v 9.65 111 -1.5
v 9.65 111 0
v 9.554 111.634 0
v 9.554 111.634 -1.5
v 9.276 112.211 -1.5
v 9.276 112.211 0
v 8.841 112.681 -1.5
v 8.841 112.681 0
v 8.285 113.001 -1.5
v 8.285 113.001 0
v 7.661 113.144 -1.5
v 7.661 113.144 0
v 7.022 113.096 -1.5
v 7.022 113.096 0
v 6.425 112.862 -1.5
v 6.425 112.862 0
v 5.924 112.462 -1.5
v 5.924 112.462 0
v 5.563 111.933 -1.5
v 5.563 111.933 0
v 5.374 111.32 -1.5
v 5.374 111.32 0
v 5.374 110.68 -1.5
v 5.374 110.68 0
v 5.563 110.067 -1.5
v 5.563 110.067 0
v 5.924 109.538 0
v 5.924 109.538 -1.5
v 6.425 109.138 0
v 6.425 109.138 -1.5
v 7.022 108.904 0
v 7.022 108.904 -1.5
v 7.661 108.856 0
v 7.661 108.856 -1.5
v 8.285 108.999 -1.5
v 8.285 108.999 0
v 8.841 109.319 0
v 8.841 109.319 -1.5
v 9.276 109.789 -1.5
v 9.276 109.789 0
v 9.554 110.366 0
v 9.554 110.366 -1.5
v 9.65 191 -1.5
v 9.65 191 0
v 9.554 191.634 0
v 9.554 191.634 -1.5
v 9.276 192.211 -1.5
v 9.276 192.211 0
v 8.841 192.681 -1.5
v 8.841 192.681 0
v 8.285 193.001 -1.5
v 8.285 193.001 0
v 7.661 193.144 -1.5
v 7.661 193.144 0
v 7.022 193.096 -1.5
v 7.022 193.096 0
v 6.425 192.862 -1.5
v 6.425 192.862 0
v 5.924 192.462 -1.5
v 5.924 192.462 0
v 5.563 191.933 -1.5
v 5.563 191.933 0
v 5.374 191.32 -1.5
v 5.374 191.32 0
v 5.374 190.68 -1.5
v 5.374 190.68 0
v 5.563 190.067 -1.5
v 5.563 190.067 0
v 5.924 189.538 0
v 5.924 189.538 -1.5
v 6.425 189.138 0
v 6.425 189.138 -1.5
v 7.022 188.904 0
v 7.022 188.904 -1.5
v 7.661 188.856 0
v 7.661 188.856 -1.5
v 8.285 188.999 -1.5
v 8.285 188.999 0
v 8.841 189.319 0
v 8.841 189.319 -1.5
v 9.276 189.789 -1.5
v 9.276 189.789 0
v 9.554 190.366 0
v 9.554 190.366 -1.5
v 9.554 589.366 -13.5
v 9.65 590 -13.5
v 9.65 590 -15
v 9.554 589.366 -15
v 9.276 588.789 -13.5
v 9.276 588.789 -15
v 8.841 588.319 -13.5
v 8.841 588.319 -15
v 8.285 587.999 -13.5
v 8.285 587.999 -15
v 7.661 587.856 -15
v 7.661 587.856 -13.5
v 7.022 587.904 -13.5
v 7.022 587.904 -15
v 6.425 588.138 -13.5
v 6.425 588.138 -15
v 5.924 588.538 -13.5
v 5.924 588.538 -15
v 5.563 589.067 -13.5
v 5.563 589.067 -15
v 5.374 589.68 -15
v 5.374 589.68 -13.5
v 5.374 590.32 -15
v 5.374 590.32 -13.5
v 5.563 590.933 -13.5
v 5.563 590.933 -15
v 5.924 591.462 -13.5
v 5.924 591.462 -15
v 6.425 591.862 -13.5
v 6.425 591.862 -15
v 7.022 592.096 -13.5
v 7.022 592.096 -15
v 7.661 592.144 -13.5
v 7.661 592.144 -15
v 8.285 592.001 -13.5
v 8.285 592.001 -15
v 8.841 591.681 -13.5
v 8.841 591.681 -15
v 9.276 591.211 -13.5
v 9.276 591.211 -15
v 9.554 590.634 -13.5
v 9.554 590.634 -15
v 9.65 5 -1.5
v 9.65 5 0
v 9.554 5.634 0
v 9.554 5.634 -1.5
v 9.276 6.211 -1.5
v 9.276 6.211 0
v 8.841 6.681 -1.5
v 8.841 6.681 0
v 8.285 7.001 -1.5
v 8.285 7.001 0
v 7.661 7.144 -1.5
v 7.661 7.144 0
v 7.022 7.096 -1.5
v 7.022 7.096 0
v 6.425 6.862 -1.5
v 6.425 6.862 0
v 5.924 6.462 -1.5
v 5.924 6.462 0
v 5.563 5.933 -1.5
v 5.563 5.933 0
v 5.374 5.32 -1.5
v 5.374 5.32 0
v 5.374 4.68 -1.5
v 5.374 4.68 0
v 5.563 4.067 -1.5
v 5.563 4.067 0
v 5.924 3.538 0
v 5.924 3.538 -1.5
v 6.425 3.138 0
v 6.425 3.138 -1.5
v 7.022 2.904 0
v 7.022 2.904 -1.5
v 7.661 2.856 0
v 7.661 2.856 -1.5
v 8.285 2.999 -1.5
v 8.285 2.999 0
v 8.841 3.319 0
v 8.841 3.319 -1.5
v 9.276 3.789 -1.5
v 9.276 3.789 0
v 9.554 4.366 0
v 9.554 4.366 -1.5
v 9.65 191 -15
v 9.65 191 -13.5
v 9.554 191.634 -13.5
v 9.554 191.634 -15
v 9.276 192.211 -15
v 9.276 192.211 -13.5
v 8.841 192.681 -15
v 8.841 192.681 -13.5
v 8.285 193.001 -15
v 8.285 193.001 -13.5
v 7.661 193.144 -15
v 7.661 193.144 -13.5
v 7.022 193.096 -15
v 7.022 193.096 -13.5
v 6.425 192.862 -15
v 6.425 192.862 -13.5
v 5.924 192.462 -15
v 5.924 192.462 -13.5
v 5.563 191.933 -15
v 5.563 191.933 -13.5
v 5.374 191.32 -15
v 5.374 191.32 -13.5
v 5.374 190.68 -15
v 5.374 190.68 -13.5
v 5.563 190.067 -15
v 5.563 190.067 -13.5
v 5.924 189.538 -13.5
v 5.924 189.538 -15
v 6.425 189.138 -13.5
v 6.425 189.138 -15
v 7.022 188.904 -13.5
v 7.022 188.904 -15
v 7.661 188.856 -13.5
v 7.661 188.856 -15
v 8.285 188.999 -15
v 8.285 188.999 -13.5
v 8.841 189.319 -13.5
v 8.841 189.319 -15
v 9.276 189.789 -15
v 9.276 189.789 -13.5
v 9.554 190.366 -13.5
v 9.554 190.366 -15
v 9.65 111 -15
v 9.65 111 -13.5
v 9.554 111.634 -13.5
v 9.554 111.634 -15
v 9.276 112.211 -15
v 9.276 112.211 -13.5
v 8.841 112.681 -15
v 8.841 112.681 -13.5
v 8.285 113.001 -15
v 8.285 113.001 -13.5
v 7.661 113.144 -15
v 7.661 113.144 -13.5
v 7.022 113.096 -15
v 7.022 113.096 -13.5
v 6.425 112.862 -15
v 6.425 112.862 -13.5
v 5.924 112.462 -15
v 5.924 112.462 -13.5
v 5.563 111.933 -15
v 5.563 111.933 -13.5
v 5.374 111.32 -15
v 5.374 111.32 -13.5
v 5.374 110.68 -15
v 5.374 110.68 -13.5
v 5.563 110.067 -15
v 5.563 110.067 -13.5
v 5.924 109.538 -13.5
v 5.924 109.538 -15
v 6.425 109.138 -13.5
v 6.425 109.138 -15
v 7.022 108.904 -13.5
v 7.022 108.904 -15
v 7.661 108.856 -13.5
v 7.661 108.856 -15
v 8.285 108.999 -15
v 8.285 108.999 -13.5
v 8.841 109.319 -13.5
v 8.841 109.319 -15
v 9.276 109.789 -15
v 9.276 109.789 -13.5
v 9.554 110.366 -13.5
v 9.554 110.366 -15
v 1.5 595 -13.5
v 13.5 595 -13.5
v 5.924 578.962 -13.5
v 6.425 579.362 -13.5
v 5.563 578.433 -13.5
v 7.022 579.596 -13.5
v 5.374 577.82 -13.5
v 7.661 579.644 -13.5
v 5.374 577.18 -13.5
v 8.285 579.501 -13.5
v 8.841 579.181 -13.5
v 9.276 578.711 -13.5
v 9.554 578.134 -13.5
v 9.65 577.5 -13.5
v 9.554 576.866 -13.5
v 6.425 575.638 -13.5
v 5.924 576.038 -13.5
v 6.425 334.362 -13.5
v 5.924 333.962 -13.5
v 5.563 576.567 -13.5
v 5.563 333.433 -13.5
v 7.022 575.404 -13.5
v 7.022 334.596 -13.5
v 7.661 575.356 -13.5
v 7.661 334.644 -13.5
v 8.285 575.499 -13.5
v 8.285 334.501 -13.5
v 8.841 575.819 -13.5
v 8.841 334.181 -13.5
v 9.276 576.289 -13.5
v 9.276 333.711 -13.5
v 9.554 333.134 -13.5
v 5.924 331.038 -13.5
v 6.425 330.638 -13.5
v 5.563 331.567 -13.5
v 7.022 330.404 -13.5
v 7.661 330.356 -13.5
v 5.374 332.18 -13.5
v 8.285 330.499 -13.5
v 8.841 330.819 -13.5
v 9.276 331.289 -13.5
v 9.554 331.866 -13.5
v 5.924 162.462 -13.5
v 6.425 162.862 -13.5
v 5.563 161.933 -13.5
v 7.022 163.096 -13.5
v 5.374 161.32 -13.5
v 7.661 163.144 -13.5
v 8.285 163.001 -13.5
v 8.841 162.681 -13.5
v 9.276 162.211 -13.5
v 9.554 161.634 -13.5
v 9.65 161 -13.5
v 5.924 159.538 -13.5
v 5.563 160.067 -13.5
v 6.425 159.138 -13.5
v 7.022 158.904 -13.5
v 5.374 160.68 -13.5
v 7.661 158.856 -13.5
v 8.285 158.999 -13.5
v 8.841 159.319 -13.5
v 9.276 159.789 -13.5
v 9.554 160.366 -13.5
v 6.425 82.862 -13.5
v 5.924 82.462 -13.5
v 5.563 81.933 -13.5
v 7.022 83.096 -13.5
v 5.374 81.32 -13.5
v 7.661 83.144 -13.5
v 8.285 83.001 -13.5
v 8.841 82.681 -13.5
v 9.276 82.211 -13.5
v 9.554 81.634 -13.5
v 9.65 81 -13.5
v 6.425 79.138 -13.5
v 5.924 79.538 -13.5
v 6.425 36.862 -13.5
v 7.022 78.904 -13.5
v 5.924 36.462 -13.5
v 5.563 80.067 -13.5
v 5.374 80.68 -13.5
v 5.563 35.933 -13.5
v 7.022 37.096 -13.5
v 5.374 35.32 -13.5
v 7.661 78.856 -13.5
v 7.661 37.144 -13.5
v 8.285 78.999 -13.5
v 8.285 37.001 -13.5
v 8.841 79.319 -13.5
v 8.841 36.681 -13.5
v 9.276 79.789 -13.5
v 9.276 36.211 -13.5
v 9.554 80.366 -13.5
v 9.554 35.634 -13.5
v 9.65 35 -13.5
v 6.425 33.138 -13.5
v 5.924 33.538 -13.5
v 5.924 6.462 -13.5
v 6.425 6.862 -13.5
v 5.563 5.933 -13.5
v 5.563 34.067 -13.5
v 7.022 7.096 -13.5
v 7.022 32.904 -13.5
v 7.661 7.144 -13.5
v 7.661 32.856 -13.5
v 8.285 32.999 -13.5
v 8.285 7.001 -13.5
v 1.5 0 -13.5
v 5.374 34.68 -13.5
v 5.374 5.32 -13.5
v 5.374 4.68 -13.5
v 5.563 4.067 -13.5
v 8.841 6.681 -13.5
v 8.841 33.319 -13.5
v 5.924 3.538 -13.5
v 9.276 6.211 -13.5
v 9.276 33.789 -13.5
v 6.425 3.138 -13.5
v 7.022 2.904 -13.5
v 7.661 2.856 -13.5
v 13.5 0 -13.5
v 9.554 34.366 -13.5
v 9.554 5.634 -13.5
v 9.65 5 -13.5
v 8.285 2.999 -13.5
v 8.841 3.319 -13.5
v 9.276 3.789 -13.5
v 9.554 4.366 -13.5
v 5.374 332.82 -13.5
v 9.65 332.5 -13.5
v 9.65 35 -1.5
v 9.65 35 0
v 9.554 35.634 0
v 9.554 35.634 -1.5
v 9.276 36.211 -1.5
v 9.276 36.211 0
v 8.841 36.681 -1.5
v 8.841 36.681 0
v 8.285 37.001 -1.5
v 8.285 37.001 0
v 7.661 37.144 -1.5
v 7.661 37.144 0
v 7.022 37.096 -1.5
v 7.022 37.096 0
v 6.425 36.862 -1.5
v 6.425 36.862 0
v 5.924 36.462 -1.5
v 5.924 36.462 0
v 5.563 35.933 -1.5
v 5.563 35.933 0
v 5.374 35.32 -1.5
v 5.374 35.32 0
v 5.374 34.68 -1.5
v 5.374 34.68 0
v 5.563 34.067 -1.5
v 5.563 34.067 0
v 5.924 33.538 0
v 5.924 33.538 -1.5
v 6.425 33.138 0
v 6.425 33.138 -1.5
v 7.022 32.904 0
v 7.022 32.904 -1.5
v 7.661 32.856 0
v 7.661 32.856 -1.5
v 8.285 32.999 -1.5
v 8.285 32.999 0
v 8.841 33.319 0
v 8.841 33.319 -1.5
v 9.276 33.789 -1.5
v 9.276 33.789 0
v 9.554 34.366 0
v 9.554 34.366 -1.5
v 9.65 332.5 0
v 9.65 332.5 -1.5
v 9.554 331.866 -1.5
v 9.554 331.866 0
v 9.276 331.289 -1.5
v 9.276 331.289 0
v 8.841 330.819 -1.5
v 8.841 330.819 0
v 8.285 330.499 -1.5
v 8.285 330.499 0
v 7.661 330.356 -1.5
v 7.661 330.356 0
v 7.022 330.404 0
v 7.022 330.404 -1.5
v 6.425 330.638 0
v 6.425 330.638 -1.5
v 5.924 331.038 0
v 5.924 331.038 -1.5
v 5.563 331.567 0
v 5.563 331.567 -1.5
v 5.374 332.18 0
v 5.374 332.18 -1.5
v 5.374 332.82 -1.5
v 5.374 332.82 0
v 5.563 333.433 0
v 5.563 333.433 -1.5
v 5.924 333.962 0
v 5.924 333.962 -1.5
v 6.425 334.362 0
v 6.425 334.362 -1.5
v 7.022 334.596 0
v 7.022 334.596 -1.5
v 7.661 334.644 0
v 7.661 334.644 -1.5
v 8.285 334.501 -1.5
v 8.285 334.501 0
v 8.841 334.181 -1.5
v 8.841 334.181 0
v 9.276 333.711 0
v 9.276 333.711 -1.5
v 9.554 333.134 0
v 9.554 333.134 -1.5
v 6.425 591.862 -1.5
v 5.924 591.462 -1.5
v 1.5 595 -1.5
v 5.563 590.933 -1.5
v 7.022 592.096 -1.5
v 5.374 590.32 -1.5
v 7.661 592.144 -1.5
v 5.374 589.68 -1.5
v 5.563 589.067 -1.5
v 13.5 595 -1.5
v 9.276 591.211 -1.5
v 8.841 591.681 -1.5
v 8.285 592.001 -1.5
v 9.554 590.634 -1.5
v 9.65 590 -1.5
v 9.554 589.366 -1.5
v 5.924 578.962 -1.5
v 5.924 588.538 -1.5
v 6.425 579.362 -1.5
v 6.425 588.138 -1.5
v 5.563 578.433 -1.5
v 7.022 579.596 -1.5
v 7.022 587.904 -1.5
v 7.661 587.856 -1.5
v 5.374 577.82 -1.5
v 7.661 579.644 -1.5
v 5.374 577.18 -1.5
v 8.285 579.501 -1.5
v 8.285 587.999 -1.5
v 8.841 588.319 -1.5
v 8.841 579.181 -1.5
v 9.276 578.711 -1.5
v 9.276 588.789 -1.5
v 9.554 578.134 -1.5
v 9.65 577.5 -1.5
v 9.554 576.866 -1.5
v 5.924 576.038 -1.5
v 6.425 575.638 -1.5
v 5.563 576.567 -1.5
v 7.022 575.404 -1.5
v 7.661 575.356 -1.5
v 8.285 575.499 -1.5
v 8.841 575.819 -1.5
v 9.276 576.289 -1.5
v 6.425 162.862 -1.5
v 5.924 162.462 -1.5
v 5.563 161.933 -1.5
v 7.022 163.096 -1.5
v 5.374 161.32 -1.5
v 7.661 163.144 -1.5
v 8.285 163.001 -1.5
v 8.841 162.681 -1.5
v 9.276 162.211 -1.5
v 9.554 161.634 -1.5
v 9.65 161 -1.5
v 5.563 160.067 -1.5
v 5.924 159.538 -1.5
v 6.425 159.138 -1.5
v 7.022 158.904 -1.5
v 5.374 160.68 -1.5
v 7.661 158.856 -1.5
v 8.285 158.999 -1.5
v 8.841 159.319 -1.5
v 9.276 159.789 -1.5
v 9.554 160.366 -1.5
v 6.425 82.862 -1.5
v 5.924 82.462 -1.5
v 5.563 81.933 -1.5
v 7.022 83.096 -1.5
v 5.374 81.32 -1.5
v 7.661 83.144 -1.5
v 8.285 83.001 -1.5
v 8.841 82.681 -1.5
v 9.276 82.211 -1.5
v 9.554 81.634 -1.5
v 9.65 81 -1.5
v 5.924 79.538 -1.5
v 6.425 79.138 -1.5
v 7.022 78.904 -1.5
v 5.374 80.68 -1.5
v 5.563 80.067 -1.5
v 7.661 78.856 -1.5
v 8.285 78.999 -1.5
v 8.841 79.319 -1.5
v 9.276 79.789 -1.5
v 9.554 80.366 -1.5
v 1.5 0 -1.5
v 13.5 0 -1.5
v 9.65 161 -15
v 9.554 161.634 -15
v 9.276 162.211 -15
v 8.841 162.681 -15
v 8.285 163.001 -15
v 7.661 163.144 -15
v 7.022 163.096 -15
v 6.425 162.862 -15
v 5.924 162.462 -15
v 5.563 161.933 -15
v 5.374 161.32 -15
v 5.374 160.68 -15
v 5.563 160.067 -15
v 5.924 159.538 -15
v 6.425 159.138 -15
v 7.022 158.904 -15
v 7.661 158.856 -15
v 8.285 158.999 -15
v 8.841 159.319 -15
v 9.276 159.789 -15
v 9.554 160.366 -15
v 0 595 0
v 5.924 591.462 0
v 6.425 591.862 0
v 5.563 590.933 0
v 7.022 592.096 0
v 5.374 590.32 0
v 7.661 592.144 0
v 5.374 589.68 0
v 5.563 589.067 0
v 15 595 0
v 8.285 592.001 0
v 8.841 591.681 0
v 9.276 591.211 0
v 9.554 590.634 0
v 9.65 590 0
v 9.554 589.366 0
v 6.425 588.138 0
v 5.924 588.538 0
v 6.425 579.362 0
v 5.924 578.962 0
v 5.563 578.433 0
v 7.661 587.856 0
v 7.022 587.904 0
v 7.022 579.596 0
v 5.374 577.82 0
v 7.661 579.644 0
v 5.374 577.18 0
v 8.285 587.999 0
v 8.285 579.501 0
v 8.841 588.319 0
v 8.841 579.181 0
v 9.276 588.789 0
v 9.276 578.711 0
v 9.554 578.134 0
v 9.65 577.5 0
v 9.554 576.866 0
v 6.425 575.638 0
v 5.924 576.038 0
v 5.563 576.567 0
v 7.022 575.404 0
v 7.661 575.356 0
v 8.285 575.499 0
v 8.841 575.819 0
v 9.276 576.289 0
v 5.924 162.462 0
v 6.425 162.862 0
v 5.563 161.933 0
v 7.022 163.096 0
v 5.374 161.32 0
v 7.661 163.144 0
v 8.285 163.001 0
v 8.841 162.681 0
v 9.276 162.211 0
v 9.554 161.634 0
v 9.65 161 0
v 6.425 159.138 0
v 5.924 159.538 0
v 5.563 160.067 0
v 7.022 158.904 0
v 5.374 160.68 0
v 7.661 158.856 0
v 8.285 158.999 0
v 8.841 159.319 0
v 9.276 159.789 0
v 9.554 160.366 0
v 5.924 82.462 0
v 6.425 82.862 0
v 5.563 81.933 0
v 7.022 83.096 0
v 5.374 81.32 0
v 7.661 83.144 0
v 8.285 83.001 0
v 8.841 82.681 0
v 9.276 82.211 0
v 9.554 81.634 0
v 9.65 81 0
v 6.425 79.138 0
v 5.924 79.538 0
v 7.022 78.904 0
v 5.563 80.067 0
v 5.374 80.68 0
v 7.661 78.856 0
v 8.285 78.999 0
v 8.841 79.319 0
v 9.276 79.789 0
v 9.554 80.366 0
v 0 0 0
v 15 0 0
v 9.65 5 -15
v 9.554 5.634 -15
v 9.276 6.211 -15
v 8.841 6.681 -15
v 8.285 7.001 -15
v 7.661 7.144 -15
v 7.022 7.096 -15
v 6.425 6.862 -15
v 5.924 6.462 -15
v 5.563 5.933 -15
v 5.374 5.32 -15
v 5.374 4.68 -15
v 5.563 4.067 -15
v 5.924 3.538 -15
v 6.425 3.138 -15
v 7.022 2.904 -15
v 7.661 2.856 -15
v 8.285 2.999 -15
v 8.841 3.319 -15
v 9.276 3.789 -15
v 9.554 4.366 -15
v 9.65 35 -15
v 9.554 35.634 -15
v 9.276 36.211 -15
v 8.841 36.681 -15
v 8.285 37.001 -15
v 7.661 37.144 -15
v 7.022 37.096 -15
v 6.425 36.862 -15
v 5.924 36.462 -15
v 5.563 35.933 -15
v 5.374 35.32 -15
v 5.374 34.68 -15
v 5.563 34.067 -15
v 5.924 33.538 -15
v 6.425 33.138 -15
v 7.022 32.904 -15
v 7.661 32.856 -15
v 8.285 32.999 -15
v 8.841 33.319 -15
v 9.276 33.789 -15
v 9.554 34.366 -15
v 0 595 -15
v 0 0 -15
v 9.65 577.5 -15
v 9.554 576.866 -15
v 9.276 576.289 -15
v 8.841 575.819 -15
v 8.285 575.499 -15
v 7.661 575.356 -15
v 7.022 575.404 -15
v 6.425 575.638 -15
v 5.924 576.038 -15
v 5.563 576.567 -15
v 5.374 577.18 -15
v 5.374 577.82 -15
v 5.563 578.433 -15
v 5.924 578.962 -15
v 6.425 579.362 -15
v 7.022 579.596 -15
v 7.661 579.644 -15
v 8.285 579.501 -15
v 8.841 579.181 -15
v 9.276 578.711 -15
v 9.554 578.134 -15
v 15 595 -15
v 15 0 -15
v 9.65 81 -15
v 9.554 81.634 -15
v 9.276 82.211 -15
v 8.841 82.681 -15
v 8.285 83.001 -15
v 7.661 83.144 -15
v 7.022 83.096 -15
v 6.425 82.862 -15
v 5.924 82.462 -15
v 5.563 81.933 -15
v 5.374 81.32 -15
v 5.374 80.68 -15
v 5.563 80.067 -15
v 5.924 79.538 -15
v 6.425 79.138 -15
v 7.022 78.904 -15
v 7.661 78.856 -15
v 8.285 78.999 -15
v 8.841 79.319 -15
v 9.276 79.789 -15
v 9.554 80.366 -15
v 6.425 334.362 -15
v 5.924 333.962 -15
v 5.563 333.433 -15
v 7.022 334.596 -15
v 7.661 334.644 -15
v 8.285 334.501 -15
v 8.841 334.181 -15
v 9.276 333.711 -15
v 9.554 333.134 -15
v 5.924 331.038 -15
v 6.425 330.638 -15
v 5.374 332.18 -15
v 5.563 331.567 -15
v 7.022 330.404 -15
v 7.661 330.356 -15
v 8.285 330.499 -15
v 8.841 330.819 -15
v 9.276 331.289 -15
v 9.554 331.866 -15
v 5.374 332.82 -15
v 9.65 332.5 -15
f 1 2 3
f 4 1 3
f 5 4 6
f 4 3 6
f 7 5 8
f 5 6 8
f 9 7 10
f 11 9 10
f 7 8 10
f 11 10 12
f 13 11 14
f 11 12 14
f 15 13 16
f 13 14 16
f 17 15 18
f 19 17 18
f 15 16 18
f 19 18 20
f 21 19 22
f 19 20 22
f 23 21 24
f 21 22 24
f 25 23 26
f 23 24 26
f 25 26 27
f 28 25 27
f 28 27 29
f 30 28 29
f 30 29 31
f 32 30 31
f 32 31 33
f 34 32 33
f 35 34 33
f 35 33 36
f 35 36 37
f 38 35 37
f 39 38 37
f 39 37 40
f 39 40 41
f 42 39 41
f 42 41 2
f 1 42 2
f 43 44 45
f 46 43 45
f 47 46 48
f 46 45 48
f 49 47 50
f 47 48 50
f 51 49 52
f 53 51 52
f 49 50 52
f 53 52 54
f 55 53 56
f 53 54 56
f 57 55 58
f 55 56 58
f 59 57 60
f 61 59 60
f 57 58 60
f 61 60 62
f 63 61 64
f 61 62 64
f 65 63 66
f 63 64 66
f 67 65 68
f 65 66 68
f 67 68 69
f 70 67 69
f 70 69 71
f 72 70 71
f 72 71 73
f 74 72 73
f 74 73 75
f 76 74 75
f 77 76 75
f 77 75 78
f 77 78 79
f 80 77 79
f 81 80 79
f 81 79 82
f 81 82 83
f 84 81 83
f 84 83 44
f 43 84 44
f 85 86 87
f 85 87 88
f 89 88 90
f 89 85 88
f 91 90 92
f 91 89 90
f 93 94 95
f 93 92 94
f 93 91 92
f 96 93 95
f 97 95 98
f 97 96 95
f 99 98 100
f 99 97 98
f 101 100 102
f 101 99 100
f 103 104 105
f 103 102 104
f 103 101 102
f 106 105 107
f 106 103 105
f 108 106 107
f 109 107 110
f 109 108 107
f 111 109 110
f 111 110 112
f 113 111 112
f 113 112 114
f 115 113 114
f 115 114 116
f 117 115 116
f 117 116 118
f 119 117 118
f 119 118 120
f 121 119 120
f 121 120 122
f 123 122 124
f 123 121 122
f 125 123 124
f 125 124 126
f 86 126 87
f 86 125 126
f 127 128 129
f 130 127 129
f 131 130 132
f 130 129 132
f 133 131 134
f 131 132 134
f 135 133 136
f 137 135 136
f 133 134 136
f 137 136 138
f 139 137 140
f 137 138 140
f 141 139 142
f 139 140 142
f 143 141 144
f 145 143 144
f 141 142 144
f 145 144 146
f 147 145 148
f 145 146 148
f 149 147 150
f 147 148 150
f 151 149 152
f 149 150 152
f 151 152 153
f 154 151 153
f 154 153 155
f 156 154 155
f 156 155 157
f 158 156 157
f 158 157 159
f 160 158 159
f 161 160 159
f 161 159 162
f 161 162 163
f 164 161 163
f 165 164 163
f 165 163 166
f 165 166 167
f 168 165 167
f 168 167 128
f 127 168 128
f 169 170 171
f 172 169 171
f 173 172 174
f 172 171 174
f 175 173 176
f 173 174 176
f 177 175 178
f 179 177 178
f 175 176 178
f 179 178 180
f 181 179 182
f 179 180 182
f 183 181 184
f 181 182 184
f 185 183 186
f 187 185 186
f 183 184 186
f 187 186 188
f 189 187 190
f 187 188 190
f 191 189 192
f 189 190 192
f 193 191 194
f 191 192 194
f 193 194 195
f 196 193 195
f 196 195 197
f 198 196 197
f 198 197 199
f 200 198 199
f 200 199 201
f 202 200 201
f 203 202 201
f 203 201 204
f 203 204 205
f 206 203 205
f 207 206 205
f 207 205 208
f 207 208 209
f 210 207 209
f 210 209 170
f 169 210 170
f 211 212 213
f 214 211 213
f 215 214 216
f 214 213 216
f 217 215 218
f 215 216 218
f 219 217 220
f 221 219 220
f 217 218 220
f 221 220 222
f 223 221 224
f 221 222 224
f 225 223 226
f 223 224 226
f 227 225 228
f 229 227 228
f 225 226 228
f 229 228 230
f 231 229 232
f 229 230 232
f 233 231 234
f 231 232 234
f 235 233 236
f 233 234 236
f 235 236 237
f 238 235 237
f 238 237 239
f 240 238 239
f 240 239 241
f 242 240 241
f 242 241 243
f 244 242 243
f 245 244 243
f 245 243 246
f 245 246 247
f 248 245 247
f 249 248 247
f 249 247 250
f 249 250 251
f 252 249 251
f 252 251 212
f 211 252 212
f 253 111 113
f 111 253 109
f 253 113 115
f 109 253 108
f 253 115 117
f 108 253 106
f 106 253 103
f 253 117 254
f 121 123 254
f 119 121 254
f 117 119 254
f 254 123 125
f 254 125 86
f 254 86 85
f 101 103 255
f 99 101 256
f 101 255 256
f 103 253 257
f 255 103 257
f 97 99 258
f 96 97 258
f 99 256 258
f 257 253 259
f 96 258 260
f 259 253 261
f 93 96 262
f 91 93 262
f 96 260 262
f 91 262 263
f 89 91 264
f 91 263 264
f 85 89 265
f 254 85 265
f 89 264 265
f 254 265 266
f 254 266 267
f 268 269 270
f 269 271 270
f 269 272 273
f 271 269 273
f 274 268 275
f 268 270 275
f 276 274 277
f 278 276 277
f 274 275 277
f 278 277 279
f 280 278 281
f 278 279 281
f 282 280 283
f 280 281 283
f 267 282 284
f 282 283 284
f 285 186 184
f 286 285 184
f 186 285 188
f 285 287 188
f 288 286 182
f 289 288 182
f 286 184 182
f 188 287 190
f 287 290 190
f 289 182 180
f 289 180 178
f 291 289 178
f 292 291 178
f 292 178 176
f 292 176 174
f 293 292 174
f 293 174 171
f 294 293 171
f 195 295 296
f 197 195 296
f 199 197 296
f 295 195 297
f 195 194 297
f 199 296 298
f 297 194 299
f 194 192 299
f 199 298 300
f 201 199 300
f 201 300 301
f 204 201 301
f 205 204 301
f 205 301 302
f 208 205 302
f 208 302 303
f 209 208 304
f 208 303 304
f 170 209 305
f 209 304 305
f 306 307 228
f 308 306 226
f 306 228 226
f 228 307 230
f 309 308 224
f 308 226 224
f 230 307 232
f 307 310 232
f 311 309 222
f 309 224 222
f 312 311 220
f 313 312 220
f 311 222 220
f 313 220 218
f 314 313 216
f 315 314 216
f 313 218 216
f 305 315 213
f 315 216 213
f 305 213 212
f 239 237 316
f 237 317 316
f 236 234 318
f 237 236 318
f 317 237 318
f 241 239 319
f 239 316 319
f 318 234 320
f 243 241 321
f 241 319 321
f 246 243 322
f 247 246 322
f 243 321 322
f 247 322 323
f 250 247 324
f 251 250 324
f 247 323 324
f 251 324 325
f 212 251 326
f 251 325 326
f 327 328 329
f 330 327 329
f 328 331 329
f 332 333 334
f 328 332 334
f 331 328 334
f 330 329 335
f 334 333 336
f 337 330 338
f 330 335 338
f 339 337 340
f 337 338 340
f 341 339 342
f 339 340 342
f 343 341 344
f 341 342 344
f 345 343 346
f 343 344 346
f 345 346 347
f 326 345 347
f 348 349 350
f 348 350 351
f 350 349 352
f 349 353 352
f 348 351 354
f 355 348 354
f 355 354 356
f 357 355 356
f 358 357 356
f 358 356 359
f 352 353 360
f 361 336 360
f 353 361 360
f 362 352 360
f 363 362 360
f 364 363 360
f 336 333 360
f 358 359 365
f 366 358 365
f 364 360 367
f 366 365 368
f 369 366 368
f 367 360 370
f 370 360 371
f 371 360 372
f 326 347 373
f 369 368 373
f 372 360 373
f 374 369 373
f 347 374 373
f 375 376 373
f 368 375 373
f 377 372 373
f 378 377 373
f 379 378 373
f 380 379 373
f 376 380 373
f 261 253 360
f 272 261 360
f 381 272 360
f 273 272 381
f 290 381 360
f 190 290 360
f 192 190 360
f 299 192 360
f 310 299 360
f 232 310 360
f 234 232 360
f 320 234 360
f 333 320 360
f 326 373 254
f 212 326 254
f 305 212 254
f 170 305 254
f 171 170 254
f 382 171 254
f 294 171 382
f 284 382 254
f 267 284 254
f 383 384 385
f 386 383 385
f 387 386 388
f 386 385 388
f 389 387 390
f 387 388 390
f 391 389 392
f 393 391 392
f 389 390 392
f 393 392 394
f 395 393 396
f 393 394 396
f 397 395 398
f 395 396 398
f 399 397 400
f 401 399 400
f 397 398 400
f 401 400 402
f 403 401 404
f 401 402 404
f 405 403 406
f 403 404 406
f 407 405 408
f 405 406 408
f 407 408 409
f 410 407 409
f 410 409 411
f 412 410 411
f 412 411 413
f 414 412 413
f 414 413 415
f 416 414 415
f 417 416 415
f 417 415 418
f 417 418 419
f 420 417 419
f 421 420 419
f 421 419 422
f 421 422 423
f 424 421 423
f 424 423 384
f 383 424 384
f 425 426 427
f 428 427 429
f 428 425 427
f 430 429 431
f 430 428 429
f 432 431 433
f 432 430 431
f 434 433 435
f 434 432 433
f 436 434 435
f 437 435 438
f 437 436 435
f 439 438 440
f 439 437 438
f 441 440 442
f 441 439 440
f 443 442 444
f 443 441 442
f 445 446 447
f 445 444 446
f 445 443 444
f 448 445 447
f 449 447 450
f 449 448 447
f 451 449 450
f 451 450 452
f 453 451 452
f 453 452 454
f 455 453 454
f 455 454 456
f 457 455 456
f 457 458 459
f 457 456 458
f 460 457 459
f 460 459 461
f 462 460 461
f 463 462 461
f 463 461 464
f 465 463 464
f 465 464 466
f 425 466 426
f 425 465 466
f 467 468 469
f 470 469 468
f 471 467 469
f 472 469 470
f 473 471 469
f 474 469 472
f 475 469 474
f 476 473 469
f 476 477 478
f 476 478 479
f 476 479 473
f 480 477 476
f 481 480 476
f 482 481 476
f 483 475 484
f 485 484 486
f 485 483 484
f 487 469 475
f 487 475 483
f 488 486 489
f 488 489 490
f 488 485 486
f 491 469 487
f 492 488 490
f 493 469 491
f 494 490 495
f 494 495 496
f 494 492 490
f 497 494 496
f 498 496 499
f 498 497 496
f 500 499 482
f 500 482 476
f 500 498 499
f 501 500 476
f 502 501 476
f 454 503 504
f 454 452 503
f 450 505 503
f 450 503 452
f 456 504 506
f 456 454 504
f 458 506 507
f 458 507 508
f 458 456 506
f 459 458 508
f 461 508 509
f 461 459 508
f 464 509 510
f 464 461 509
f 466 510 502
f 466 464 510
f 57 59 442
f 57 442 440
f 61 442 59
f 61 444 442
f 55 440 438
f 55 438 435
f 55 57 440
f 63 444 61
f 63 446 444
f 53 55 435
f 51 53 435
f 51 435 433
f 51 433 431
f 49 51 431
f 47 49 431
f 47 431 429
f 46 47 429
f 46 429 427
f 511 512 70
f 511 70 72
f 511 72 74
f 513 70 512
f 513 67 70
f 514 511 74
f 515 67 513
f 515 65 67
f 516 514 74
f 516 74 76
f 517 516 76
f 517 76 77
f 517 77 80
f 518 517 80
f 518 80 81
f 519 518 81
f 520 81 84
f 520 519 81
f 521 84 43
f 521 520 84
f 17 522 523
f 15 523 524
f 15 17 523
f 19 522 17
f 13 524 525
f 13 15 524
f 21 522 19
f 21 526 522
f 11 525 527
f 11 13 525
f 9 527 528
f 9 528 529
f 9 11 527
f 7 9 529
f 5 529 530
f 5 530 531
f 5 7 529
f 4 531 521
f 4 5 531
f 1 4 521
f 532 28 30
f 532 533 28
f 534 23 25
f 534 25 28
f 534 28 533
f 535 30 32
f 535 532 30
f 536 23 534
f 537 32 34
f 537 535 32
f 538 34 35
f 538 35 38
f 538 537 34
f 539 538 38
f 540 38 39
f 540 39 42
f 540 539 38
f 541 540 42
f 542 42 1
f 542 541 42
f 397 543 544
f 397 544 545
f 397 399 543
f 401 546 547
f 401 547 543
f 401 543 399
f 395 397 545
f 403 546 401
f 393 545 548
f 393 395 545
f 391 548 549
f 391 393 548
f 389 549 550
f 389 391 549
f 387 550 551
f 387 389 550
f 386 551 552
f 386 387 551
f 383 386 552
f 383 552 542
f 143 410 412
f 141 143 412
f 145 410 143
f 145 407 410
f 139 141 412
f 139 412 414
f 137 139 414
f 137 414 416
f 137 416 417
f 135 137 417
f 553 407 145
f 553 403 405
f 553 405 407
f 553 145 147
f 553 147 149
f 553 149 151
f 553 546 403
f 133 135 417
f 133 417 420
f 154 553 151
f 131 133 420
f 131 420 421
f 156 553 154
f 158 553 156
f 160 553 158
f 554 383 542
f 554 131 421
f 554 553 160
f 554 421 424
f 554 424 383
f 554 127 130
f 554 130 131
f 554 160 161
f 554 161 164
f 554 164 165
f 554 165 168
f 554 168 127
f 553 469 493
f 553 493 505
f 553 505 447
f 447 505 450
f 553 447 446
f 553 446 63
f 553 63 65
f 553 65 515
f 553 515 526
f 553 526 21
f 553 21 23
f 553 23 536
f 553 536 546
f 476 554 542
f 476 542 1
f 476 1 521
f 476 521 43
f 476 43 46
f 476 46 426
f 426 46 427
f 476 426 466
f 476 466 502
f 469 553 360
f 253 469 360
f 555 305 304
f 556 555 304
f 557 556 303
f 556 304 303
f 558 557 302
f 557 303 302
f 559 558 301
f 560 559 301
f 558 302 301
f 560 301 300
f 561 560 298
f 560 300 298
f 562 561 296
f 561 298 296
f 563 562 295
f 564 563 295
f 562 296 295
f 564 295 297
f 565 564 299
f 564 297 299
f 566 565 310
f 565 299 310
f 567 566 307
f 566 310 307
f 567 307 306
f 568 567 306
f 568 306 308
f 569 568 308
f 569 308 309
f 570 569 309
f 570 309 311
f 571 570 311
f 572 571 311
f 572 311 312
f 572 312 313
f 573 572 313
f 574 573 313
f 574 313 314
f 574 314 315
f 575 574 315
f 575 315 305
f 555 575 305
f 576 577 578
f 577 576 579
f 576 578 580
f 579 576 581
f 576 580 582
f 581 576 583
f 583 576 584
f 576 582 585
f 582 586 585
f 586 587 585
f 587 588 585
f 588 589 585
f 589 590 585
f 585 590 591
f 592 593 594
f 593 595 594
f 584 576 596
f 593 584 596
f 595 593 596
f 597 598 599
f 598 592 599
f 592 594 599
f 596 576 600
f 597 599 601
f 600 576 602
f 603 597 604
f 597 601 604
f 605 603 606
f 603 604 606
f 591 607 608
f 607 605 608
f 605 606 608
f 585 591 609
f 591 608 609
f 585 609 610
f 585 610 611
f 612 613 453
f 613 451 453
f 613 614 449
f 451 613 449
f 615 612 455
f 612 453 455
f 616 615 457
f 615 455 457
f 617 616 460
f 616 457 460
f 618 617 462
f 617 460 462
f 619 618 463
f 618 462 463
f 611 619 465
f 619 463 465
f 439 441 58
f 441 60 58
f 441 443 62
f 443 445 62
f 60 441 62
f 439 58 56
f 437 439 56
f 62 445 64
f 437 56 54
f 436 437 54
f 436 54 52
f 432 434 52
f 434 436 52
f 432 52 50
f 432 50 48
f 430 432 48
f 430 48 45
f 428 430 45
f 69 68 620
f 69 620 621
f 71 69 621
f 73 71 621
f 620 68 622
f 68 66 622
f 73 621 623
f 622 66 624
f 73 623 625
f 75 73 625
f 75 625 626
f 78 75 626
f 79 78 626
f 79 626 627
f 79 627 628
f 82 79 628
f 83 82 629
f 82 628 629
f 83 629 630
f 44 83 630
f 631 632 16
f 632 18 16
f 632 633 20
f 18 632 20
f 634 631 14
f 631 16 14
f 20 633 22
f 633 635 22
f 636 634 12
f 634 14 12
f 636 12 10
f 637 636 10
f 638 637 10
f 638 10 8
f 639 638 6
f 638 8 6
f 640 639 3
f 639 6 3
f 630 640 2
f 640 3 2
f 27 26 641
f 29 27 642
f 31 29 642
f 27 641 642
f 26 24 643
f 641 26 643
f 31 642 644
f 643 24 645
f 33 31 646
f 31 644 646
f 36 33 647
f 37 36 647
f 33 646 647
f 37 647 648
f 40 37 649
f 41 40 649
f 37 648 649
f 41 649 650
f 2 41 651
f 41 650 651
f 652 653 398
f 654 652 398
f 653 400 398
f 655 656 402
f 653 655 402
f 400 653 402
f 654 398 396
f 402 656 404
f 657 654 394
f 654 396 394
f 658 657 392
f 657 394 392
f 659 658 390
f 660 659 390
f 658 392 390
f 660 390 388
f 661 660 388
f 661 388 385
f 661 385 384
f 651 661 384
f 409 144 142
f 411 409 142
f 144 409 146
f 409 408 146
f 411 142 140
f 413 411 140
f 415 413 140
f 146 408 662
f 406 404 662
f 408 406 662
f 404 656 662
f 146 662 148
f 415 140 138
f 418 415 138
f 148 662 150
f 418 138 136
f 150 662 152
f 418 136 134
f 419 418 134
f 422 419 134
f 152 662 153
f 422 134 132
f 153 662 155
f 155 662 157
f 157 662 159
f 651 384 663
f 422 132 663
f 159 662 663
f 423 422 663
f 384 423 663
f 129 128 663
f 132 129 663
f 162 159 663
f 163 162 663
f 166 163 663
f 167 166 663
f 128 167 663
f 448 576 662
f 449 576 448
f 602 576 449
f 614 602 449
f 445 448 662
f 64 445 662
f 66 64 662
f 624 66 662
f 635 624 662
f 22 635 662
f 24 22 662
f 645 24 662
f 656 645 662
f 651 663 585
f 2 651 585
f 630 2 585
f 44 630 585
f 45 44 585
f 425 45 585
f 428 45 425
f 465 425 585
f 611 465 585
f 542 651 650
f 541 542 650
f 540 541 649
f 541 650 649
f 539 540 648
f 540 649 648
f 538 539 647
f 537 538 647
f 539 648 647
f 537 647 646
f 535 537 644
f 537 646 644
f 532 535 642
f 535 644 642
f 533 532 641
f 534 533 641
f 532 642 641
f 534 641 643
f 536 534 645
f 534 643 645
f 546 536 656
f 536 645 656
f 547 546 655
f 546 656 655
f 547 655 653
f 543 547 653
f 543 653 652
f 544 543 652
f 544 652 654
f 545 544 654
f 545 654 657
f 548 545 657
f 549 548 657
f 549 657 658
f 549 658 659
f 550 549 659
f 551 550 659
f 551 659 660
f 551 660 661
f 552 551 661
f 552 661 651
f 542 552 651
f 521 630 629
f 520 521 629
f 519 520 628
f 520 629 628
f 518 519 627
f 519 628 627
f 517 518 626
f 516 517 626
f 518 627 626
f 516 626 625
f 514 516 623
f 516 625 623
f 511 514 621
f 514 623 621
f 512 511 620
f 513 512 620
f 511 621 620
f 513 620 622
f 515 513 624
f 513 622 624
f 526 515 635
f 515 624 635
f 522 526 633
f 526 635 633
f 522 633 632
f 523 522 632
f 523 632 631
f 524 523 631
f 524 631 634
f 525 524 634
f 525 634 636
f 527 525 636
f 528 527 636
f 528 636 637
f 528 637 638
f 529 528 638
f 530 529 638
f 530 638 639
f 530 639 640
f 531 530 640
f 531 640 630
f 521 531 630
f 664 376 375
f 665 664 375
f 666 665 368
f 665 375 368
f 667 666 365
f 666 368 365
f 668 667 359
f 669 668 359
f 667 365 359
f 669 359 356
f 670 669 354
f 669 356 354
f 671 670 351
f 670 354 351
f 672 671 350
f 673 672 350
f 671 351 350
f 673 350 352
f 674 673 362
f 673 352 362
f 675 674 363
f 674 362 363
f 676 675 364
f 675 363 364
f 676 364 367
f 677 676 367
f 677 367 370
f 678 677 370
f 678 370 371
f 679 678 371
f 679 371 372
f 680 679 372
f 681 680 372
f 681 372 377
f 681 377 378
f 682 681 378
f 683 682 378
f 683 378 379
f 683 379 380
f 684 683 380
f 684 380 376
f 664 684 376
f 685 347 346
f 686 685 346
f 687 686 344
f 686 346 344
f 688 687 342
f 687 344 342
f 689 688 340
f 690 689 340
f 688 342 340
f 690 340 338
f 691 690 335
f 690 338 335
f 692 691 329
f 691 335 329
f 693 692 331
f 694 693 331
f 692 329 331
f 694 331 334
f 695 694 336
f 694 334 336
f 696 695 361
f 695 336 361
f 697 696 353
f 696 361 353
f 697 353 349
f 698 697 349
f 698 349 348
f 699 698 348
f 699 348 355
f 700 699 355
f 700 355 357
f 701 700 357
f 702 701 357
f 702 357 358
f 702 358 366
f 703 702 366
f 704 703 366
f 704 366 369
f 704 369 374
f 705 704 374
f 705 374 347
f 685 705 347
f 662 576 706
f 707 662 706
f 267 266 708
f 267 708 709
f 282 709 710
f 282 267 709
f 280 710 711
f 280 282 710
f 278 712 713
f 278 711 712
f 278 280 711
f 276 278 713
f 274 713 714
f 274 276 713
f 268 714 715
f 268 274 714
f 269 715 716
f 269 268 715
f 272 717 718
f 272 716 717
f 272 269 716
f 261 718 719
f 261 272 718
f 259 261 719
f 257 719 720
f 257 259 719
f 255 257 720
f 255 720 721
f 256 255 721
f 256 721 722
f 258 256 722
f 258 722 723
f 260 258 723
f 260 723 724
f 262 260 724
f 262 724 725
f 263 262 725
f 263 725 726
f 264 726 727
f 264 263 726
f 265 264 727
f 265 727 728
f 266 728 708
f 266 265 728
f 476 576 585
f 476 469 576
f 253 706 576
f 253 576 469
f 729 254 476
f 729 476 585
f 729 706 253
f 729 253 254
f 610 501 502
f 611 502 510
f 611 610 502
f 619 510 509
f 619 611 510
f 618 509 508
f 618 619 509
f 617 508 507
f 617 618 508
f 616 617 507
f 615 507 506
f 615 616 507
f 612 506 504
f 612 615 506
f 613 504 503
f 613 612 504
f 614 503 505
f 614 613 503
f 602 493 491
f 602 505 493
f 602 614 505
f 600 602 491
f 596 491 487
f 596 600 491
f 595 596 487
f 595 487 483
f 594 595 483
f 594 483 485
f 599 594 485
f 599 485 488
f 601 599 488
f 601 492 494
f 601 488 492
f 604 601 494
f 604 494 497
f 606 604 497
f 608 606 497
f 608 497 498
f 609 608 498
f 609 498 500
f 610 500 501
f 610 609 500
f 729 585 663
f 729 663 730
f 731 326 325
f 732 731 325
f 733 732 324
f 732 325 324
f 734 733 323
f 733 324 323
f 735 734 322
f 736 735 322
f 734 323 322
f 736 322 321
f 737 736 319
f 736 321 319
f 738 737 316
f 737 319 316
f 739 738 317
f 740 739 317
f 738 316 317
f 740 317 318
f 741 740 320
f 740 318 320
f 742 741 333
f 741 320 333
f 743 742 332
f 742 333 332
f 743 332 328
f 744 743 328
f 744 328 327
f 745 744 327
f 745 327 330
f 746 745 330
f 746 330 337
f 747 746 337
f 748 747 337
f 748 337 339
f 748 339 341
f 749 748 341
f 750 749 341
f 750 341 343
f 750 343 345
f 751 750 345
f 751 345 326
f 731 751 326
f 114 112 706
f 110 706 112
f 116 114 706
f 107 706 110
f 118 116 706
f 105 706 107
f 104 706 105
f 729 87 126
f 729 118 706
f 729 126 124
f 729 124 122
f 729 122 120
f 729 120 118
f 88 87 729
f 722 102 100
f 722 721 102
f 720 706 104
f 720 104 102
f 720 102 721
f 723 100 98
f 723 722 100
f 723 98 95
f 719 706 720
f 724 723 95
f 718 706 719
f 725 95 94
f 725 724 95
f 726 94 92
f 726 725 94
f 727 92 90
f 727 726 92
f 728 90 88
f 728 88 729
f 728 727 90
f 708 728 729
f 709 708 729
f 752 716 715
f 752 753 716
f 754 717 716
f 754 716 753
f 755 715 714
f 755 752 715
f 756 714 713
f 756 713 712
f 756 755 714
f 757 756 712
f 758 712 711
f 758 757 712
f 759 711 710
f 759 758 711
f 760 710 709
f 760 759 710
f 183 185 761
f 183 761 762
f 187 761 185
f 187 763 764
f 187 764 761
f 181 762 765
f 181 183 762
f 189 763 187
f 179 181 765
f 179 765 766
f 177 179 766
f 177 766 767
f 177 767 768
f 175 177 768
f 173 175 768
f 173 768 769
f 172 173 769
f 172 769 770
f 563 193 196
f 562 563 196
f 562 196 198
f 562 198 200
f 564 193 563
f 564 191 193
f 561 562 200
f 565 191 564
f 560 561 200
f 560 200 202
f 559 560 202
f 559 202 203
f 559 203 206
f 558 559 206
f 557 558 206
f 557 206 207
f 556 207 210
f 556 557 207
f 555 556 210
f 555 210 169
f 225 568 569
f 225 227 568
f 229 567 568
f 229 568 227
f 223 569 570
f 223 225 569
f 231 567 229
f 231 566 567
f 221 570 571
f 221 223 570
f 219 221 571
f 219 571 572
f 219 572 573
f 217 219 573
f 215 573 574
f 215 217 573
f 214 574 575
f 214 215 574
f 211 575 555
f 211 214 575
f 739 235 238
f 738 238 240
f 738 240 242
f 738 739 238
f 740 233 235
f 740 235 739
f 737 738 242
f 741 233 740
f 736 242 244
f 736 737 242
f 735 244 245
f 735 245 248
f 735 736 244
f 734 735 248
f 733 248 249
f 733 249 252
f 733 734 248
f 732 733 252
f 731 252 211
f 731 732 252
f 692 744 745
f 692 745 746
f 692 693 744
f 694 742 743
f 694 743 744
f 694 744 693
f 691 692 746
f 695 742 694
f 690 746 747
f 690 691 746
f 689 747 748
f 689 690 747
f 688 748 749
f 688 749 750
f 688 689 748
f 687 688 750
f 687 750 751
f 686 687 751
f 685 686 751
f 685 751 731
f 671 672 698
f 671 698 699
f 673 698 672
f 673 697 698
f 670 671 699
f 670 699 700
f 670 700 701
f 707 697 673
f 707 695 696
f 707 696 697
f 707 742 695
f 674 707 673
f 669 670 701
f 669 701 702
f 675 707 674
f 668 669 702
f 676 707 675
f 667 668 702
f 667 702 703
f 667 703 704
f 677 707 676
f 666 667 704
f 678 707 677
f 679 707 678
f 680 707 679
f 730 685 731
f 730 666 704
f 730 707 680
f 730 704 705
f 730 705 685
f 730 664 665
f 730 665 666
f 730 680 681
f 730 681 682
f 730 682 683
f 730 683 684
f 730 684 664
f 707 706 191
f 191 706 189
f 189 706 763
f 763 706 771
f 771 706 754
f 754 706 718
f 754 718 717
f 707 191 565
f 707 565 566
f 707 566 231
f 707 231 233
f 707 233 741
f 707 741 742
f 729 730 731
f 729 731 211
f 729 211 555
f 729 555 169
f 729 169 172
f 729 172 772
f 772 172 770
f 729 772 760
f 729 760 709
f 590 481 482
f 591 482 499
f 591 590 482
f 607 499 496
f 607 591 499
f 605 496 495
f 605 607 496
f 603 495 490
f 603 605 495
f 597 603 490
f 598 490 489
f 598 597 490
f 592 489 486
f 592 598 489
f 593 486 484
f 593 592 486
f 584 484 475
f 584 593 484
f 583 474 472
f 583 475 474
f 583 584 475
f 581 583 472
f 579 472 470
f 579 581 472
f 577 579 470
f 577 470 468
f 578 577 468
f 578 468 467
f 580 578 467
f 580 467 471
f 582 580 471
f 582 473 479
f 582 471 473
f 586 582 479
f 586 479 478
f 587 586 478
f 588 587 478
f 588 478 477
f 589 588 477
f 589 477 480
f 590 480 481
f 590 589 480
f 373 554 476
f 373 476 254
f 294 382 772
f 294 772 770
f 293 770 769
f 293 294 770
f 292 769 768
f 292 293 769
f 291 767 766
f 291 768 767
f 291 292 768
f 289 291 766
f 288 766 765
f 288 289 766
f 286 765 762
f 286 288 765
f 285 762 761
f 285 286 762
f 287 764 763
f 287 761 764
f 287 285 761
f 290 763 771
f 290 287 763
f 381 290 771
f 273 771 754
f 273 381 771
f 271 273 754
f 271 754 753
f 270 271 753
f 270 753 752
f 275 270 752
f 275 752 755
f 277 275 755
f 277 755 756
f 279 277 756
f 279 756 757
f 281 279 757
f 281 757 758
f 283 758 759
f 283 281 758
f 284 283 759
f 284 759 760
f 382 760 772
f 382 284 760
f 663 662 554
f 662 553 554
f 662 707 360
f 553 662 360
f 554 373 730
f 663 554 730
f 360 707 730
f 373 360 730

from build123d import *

# Parameters (mm, degrees)
SKETCH_1_W          = 15
SKETCH_1_H          = 15
SKETCH_1_W_2        = 12
SKETCH_1_H_2        = 12
EXTRUDE_1_DEPTH     = 595
CUT_EXTRUDE_2_REACH = 597.378
SKETCH_3_R          = 2.15
SKETCH_4_R          = 2.15
CUT_EXTRUDE_3_DEPTH = 596.37803117


with BuildPart() as part:
    # ｽｹｯﾁ1 → 押し出し-薄板1 (new body)
    with BuildSketch(Plane(origin=(0, 0, 0), x_dir=(1, 0, 0), z_dir=(0, 1, 0))):
        with Locations((7.5, 7.5)):
            Rectangle(SKETCH_1_W, SKETCH_1_H)
        with Locations((7.5, 7.5)):
            Rectangle(SKETCH_1_W_2, SKETCH_1_H_2, mode=Mode.SUBTRACT)
    extrude(amount=EXTRUDE_1_DEPTH)

    # ｶｯﾄ - 押し出し2: up to this face of the body (flat: up to its plane)
    cut_extrude_2_end = Plane(part.part.faces().sort_by_distance((7.5, 297.5, -15))[0])
    # ｽｹｯﾁ3 → ｶｯﾄ - 押し出し2 (cut, up to the picked face)
    with BuildSketch(Plane.XY, mode=Mode.PRIVATE) as cut_extrude_2_sk1:
        with Locations((7.5, 81)):
            Circle(SKETCH_3_R)
    cut_extrude_2_tool1 = split(extrude(cut_extrude_2_sk1.sketch, amount=-CUT_EXTRUDE_2_REACH, mode=Mode.PRIVATE), bisect_by=cut_extrude_2_end, keep=Keep.BOTH, mode=Mode.PRIVATE)
    # ｽｹｯﾁ3 → ｶｯﾄ - 押し出し2 (cut, up to the picked face)
    with BuildSketch(Plane.XY, mode=Mode.PRIVATE) as cut_extrude_2_sk2:
        with Locations((7.5, 111)):
            Circle(SKETCH_3_R)
    cut_extrude_2_tool2 = split(extrude(cut_extrude_2_sk2.sketch, amount=-CUT_EXTRUDE_2_REACH, mode=Mode.PRIVATE), bisect_by=cut_extrude_2_end, keep=Keep.BOTH, mode=Mode.PRIVATE)
    # ｽｹｯﾁ3 → ｶｯﾄ - 押し出し2 (cut, up to the picked face)
    with BuildSketch(Plane.XY, mode=Mode.PRIVATE) as cut_extrude_2_sk3:
        with Locations((7.5, 161)):
            Circle(SKETCH_3_R)
    cut_extrude_2_tool3 = split(extrude(cut_extrude_2_sk3.sketch, amount=-CUT_EXTRUDE_2_REACH, mode=Mode.PRIVATE), bisect_by=cut_extrude_2_end, keep=Keep.BOTH, mode=Mode.PRIVATE)
    # ｽｹｯﾁ3 → ｶｯﾄ - 押し出し2 (cut, up to the picked face)
    with BuildSketch(Plane.XY, mode=Mode.PRIVATE) as cut_extrude_2_sk4:
        with Locations((7.5, 191)):
            Circle(SKETCH_3_R)
    cut_extrude_2_tool4 = split(extrude(cut_extrude_2_sk4.sketch, amount=-CUT_EXTRUDE_2_REACH, mode=Mode.PRIVATE), bisect_by=cut_extrude_2_end, keep=Keep.BOTH, mode=Mode.PRIVATE)
    # ｽｹｯﾁ3 → ｶｯﾄ - 押し出し2 (cut, up to the picked face)
    with BuildSketch(Plane.XY, mode=Mode.PRIVATE) as cut_extrude_2_sk5:
        with Locations((7.5, 5)):
            Circle(SKETCH_3_R)
    cut_extrude_2_tool5 = split(extrude(cut_extrude_2_sk5.sketch, amount=-CUT_EXTRUDE_2_REACH, mode=Mode.PRIVATE), bisect_by=cut_extrude_2_end, keep=Keep.BOTH, mode=Mode.PRIVATE)
    # ｽｹｯﾁ3 → ｶｯﾄ - 押し出し2 (cut, up to the picked face)
    with BuildSketch(Plane.XY, mode=Mode.PRIVATE) as cut_extrude_2_sk6:
        with Locations((7.5, 35)):
            Circle(SKETCH_3_R)
    cut_extrude_2_tool6 = split(extrude(cut_extrude_2_sk6.sketch, amount=-CUT_EXTRUDE_2_REACH, mode=Mode.PRIVATE), bisect_by=cut_extrude_2_end, keep=Keep.BOTH, mode=Mode.PRIVATE)
    add(cut_extrude_2_tool1.solids().sort_by(Axis((7.5, 81, 0), (0, 0, -1)))[0], mode=Mode.SUBTRACT)
    add(cut_extrude_2_tool2.solids().sort_by(Axis((7.5, 111, 0), (0, 0, -1)))[0], mode=Mode.SUBTRACT)
    add(cut_extrude_2_tool3.solids().sort_by(Axis((7.5, 161, 0), (0, 0, -1)))[0], mode=Mode.SUBTRACT)
    add(cut_extrude_2_tool4.solids().sort_by(Axis((7.5, 191, 0), (0, 0, -1)))[0], mode=Mode.SUBTRACT)
    add(cut_extrude_2_tool5.solids().sort_by(Axis((7.5, 5, 0), (0, 0, -1)))[0], mode=Mode.SUBTRACT)
    add(cut_extrude_2_tool6.solids().sort_by(Axis((7.5, 35, 0), (0, 0, -1)))[0], mode=Mode.SUBTRACT)

    # ｽｹｯﾁ4 → ｶｯﾄ - 押し出し3 (cut, through all)
    with BuildSketch(Plane(origin=(15, 0, 0), x_dir=(-1, 0, 0), z_dir=(0, 0, -1))):
        with Locations(Location((7.5, 577.5, 0), (0, 0, 180))):
            Circle(SKETCH_4_R)
        with Locations(Location((7.5, 590, 0), (0, 0, 180))):
            Circle(SKETCH_4_R)
        with Locations(Location((7.5, 332.5, 0), (0, 0, 180))):
            Circle(SKETCH_4_R)
    extrude(amount=CUT_EXTRUDE_3_DEPTH, mode=Mode.SUBTRACT)


solid = part.part
